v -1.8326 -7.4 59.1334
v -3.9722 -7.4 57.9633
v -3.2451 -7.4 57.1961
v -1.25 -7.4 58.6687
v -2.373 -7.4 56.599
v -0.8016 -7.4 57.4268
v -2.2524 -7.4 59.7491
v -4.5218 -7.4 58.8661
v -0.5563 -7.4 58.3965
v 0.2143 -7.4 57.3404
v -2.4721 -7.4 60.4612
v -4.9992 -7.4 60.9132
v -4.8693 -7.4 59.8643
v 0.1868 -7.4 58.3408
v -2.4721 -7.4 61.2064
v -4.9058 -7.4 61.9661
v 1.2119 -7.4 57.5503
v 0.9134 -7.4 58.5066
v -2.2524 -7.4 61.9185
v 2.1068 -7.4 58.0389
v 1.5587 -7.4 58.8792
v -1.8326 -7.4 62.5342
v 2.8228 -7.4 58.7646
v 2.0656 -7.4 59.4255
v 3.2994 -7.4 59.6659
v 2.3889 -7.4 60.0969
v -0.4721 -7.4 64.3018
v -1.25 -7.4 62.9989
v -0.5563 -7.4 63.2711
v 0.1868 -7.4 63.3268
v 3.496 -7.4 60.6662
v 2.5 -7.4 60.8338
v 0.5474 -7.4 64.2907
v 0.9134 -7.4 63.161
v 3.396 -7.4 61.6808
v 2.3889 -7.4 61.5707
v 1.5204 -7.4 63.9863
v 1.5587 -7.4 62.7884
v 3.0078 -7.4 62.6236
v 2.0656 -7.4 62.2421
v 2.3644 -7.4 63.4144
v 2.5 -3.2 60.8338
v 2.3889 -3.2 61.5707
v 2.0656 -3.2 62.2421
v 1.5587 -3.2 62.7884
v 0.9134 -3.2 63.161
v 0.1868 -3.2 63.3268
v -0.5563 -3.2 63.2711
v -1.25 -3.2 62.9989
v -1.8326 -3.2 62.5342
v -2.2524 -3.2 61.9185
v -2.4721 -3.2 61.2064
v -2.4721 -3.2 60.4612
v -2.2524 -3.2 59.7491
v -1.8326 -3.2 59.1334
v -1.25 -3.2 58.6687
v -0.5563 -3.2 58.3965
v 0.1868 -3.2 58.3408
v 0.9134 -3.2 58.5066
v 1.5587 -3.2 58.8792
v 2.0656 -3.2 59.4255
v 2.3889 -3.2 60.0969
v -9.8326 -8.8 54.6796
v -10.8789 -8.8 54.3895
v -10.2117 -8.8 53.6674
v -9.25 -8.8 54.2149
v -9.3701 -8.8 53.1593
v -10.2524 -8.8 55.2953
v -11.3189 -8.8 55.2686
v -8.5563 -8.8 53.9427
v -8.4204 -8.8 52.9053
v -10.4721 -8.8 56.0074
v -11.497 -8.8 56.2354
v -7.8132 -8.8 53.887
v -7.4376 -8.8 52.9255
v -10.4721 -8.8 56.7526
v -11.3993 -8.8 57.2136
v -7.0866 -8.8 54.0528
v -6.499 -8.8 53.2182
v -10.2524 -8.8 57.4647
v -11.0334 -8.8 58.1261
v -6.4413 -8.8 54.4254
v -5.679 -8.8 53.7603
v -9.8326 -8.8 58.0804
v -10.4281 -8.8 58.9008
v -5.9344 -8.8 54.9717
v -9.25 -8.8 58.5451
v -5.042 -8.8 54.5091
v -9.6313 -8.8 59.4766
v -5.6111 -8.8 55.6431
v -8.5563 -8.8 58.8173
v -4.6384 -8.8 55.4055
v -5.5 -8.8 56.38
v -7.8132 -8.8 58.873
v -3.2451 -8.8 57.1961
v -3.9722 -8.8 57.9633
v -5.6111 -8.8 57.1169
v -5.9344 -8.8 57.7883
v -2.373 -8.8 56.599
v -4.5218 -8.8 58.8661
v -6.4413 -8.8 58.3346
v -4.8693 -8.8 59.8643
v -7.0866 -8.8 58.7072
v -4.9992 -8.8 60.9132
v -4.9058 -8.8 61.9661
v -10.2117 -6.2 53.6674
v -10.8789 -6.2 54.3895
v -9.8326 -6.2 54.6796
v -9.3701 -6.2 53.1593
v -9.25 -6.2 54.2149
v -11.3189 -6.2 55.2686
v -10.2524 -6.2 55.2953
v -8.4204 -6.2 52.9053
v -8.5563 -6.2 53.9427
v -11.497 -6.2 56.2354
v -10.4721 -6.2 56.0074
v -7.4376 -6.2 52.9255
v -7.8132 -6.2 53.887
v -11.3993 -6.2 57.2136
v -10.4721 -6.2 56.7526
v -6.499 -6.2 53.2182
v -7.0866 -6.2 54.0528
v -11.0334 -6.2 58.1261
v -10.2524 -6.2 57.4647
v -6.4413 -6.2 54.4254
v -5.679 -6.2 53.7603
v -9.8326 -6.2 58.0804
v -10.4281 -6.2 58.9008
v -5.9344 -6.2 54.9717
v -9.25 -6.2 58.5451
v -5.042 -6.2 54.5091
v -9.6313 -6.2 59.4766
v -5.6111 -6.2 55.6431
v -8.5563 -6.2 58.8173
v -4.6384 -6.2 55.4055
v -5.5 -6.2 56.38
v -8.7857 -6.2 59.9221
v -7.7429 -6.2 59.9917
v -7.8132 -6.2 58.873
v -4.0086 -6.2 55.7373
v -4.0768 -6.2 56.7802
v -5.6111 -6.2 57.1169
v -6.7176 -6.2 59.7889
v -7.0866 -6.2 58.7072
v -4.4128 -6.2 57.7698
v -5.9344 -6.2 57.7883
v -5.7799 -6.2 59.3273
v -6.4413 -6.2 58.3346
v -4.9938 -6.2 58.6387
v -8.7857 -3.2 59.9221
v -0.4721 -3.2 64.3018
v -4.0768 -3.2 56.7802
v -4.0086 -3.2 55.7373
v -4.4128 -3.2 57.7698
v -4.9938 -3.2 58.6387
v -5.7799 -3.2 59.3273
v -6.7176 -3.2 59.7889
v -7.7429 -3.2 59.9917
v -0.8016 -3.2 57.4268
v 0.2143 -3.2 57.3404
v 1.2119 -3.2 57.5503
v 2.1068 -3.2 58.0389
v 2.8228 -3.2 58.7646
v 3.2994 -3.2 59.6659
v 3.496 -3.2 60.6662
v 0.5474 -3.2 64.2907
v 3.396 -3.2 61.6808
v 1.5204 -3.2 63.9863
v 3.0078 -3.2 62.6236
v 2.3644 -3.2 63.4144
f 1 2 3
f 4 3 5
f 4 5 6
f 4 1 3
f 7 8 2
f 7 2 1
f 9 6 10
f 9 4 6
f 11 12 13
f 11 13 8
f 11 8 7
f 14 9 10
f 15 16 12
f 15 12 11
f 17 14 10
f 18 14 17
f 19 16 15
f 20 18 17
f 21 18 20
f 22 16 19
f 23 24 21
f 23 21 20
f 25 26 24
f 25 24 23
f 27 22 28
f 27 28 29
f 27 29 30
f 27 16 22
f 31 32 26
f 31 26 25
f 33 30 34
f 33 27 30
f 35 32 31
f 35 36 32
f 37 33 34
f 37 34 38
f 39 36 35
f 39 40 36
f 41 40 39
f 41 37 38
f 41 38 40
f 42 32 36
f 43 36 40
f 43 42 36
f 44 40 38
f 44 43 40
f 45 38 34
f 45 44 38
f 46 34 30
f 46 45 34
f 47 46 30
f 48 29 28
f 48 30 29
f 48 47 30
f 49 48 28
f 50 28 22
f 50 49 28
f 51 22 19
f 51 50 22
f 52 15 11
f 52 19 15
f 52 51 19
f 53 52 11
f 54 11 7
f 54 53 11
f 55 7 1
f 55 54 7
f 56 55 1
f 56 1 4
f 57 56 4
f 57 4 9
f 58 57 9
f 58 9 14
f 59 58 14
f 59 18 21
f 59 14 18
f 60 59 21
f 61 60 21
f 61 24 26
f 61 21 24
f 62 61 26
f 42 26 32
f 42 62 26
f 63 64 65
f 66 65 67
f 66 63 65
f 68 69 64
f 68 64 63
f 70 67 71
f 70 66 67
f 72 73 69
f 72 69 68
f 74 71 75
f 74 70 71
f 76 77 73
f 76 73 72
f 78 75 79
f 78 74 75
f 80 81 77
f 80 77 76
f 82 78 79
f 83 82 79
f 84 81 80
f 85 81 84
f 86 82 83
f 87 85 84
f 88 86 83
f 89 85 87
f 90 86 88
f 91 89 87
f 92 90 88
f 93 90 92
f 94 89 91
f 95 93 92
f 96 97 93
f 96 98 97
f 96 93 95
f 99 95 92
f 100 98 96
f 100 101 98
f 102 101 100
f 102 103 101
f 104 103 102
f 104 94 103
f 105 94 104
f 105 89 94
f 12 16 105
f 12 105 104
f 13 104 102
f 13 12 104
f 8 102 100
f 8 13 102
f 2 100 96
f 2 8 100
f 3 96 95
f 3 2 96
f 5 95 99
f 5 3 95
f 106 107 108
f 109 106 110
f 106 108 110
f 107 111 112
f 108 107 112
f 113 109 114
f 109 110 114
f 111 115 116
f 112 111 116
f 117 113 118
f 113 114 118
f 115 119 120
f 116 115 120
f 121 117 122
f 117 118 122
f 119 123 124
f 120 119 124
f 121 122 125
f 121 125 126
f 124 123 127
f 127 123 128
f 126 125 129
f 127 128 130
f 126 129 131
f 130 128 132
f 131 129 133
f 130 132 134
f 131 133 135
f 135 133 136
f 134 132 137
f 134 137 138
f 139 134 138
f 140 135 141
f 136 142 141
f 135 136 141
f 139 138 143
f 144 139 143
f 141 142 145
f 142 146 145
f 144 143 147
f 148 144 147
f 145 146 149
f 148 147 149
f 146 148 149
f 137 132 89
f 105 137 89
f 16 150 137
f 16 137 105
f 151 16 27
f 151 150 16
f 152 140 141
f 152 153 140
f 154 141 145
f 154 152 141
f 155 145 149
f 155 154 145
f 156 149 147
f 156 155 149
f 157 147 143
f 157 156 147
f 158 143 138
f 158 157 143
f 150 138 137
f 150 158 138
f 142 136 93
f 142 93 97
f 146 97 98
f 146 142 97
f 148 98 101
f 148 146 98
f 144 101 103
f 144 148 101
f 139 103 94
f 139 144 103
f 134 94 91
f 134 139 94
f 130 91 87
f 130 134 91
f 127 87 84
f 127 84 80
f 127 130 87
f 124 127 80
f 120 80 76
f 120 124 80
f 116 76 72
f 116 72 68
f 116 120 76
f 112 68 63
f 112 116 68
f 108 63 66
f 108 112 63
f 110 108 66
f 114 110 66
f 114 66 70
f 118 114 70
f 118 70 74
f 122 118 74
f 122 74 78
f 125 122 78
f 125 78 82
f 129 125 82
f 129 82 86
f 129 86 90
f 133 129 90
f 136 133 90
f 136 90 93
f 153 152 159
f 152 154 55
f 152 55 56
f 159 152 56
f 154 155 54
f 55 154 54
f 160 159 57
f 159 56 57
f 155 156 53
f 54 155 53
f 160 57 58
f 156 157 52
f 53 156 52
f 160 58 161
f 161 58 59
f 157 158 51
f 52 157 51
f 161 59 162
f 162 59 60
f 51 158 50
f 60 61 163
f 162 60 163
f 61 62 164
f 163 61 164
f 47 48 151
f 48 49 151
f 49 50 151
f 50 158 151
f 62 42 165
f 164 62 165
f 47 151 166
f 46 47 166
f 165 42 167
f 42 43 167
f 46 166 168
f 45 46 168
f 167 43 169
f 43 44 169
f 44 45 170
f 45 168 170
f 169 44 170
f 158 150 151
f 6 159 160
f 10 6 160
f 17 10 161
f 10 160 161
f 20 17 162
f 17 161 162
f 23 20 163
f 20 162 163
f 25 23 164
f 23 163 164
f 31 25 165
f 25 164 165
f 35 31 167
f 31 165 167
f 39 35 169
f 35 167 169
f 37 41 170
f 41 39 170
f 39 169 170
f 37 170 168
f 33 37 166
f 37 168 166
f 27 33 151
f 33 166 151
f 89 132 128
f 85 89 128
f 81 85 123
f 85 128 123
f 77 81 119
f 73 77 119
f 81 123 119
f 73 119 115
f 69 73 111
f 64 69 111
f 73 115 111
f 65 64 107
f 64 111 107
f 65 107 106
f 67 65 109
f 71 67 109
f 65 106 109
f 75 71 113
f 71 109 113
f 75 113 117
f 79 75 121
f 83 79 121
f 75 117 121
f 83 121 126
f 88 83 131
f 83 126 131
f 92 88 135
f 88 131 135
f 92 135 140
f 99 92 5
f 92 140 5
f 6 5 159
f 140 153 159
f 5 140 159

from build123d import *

# Parameters (mm, degrees)
SKETCH011_R       = 2.5
PAD009_DEPTH      = 5.6
CYLINDER006_R     = 4
CYLINDER006_DEPTH = 8
CYLINDER007_R     = 5
CYLINDER007_DEPTH = 10


with BuildPart() as part:
    # Sketch011 → Pad009 (new body)
    with BuildSketch(Plane.XZ.offset(3.2)):
        with BuildLine():
            ThreePointArc((-0.801584, 57.426821), (3.495987, 60.666233), (-0.47207, 64.301812))
            Line((-9.631324, 59.476576), (-0.47207, 64.301812))
            ThreePointArc((-9.631324, 59.476576), (-10.211746, 53.667403), (-4.638391, 55.405532))
            Line((-4.638391, 55.405532), (-0.801584, 57.426821))
        make_face()
        with Locations((-8, 56.38)):
            Circle(SKETCH011_R, mode=Mode.SUBTRACT)
        with Locations((0, 60.833794)):
            Circle(SKETCH011_R, mode=Mode.SUBTRACT)
    extrude(amount=PAD009_DEPTH)

    # Cylinder006 → Cylinder006 (cut)
    with BuildSketch(Plane(origin=(-8, 1.8, 56), x_dir=(1, 0, 0), z_dir=(0, -1, 0))):
        Circle(CYLINDER006_R)
    extrude(amount=CYLINDER006_DEPTH, mode=Mode.SUBTRACT)

    # Cylinder007 → Cylinder007 (cut)
    with BuildSketch(Plane(origin=(0, -7.4, 61), x_dir=(1, 0, 0), z_dir=(0, -1, 0))):
        Circle(CYLINDER007_R)
    extrude(amount=CYLINDER007_DEPTH, mode=Mode.SUBTRACT)


solid = part.part
